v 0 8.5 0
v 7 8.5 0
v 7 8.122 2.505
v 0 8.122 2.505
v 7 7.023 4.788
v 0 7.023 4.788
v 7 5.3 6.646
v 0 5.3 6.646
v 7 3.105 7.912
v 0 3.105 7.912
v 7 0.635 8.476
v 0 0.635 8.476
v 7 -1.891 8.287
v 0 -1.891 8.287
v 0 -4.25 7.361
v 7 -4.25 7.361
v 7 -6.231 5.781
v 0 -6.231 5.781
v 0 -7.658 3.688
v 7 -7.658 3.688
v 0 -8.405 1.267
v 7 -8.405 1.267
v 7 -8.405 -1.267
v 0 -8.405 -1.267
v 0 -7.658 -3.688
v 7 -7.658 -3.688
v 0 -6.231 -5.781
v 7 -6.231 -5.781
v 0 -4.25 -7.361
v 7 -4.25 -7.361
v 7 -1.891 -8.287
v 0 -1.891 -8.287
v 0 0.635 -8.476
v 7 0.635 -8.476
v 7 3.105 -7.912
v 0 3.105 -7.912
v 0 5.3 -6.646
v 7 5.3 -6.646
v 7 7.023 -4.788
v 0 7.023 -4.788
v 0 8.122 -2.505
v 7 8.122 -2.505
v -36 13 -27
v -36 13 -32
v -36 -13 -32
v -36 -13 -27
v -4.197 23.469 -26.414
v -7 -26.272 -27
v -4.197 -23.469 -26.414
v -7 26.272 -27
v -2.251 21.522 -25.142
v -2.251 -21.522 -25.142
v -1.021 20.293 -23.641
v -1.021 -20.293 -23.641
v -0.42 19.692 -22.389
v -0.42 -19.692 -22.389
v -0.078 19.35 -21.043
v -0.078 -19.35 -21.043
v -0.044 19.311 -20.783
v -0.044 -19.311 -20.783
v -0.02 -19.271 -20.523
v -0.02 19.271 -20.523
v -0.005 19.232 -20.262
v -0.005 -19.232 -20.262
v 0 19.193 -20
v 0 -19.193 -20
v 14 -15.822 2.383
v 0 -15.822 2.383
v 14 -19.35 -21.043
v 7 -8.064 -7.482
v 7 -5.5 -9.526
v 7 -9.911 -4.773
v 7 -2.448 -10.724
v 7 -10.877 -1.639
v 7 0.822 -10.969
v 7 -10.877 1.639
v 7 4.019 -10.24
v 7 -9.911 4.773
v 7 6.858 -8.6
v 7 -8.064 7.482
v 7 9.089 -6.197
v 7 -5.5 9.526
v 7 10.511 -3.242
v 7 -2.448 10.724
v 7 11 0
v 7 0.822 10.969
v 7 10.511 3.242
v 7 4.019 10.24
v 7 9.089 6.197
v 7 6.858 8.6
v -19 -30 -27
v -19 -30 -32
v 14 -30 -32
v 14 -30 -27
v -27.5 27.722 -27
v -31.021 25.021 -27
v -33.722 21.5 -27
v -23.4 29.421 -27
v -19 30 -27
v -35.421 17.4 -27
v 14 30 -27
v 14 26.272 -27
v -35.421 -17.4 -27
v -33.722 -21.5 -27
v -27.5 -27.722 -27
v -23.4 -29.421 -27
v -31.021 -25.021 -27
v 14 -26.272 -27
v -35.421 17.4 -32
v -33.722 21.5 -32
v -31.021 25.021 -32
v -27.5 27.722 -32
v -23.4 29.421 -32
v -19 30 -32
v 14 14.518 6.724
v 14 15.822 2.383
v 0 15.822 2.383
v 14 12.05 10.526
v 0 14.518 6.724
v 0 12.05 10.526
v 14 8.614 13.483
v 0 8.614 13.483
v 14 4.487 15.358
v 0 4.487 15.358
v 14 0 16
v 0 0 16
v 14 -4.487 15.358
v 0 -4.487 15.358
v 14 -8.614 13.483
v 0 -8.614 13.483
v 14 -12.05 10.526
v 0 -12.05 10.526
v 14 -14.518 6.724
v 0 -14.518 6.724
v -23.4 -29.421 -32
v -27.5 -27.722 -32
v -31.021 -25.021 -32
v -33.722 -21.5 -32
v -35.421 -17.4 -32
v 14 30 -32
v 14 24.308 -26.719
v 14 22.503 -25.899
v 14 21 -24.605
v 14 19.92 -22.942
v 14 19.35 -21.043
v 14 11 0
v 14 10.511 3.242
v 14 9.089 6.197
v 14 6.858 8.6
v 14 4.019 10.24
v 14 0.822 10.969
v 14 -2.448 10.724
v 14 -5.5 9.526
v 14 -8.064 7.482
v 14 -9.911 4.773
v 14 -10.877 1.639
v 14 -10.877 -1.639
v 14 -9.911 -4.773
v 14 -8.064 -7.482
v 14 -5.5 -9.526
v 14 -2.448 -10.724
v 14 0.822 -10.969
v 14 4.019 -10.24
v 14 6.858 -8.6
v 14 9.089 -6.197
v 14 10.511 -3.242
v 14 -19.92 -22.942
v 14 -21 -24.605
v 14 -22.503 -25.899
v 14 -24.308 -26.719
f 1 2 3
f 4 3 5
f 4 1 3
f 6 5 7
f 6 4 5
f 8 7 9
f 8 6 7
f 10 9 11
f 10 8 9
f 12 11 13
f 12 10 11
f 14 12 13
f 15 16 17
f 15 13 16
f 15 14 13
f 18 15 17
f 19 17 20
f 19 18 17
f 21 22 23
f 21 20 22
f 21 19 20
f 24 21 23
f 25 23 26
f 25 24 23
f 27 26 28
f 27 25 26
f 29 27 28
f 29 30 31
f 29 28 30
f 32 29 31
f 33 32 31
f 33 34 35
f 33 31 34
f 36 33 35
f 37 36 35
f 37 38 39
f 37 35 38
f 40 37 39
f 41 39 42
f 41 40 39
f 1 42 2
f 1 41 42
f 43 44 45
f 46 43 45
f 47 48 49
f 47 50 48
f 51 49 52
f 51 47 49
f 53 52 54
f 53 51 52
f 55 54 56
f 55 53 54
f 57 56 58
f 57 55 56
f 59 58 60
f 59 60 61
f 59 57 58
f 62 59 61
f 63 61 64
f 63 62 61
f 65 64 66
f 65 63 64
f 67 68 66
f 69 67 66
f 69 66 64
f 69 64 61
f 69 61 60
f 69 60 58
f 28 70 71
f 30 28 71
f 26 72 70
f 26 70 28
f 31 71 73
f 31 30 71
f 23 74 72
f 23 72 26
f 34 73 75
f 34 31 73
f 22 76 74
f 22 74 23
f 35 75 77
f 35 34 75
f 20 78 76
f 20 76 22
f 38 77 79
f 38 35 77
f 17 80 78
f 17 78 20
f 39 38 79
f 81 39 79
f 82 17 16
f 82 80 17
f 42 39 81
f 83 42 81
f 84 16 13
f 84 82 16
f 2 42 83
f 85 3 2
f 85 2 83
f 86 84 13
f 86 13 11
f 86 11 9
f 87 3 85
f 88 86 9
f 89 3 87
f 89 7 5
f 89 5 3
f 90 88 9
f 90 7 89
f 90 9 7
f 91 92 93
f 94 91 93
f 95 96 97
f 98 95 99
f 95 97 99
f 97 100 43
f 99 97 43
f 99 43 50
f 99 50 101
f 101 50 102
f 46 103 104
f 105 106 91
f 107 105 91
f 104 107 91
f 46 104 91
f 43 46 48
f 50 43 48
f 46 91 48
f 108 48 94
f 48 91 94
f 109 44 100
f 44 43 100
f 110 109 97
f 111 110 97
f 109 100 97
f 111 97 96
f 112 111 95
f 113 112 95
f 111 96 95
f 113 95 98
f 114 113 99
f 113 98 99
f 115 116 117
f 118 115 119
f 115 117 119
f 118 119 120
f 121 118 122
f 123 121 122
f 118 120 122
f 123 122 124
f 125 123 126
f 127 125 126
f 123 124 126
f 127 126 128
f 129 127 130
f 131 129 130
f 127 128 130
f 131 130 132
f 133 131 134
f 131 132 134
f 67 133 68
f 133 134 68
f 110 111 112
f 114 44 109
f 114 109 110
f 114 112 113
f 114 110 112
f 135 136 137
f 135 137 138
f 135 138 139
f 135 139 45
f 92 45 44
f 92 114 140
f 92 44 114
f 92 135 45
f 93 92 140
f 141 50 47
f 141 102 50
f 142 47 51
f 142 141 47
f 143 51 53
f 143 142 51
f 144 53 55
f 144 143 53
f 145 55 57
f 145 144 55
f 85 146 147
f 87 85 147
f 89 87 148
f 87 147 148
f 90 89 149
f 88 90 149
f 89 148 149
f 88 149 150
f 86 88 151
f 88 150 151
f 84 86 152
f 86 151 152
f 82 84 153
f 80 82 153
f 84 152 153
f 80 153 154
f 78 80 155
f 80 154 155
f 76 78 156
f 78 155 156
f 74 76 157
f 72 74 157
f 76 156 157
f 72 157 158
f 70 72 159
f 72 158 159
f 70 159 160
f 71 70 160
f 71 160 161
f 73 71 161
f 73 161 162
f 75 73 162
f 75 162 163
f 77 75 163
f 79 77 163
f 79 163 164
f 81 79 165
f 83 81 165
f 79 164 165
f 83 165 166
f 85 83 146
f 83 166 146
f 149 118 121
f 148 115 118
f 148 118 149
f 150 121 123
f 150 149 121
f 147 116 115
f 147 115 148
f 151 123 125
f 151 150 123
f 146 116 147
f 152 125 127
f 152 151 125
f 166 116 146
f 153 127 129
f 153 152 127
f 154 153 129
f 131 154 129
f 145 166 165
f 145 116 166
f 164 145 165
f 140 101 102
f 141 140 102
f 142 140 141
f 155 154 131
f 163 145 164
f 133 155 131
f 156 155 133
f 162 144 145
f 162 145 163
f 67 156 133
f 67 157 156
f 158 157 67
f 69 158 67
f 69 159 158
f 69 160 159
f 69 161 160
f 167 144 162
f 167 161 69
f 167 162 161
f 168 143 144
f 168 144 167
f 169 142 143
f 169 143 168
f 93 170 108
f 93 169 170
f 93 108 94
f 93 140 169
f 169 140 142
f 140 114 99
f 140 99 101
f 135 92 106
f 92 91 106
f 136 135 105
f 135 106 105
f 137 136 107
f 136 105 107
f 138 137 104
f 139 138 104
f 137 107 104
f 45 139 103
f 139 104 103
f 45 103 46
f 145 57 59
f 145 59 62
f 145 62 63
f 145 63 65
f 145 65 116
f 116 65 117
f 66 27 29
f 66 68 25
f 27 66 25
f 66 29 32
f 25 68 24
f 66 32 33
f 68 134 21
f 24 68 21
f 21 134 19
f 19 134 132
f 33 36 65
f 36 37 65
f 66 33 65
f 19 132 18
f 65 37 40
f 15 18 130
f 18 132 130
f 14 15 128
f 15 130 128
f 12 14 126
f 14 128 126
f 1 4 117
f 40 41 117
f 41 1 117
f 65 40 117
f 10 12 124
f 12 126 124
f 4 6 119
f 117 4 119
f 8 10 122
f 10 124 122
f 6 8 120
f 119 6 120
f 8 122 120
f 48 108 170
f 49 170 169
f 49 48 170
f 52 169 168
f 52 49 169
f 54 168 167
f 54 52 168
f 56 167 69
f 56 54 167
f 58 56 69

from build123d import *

# Parameters (mm, degrees)
F0_R     = 8.5
F1_DEPTH = 14
F2_R     = 11
F3_DEPTH = 7
F4_W     = 50
F4_H     = 60
F5_DEPTH = 5
F6_R     = 7
F7_R     = 17


with BuildPart() as f1:
    # F0 (on Right) → F1 (new body)
    with BuildSketch(Plane.YZ):
        with BuildLine():
            Line((21, -32), (15.821561, 2.382899))
            ThreePointArc((15.821561, 2.382899), (0, 16), (-15.821561, 2.382899))
            Line((-15.821561, 2.382899), (-21, -32))
            Line((-21, -32), (21, -32))
        make_face()
        Circle(F0_R, mode=Mode.SUBTRACT)
    extrude(amount=F1_DEPTH)

    # F2 (on face) → F3 (cut)
    with BuildSketch(Plane.YZ.offset(14)):
        Circle(F2_R)
    extrude(amount=-F3_DEPTH, mode=Mode.SUBTRACT)

    # F4 (on face) → F5 (join)
    with BuildSketch(Plane(origin=(0, 0, -32), x_dir=(1, 0, 0), z_dir=(0, 0, -1))):
        with Locations((-11, 0)):
            Rectangle(F4_W, F4_H)
    extrude(amount=-F5_DEPTH)

    # F6
    f6_edges = [f1.edges().sort_by_distance(p)[0] for p in [
        (7, -20.246946, -27),
        (0, 0, -27),
        (7, 20.246946, -27),
    ]]
    fillet(f6_edges, radius=F6_R)

    # F7
    f7_edges = [f1.edges().sort_by_distance(p)[0] for p in [
        (-36, -30, -29.5),
        (-36, 30, -29.5),
    ]]
    fillet(f7_edges, radius=F7_R)


solid = f1.part
